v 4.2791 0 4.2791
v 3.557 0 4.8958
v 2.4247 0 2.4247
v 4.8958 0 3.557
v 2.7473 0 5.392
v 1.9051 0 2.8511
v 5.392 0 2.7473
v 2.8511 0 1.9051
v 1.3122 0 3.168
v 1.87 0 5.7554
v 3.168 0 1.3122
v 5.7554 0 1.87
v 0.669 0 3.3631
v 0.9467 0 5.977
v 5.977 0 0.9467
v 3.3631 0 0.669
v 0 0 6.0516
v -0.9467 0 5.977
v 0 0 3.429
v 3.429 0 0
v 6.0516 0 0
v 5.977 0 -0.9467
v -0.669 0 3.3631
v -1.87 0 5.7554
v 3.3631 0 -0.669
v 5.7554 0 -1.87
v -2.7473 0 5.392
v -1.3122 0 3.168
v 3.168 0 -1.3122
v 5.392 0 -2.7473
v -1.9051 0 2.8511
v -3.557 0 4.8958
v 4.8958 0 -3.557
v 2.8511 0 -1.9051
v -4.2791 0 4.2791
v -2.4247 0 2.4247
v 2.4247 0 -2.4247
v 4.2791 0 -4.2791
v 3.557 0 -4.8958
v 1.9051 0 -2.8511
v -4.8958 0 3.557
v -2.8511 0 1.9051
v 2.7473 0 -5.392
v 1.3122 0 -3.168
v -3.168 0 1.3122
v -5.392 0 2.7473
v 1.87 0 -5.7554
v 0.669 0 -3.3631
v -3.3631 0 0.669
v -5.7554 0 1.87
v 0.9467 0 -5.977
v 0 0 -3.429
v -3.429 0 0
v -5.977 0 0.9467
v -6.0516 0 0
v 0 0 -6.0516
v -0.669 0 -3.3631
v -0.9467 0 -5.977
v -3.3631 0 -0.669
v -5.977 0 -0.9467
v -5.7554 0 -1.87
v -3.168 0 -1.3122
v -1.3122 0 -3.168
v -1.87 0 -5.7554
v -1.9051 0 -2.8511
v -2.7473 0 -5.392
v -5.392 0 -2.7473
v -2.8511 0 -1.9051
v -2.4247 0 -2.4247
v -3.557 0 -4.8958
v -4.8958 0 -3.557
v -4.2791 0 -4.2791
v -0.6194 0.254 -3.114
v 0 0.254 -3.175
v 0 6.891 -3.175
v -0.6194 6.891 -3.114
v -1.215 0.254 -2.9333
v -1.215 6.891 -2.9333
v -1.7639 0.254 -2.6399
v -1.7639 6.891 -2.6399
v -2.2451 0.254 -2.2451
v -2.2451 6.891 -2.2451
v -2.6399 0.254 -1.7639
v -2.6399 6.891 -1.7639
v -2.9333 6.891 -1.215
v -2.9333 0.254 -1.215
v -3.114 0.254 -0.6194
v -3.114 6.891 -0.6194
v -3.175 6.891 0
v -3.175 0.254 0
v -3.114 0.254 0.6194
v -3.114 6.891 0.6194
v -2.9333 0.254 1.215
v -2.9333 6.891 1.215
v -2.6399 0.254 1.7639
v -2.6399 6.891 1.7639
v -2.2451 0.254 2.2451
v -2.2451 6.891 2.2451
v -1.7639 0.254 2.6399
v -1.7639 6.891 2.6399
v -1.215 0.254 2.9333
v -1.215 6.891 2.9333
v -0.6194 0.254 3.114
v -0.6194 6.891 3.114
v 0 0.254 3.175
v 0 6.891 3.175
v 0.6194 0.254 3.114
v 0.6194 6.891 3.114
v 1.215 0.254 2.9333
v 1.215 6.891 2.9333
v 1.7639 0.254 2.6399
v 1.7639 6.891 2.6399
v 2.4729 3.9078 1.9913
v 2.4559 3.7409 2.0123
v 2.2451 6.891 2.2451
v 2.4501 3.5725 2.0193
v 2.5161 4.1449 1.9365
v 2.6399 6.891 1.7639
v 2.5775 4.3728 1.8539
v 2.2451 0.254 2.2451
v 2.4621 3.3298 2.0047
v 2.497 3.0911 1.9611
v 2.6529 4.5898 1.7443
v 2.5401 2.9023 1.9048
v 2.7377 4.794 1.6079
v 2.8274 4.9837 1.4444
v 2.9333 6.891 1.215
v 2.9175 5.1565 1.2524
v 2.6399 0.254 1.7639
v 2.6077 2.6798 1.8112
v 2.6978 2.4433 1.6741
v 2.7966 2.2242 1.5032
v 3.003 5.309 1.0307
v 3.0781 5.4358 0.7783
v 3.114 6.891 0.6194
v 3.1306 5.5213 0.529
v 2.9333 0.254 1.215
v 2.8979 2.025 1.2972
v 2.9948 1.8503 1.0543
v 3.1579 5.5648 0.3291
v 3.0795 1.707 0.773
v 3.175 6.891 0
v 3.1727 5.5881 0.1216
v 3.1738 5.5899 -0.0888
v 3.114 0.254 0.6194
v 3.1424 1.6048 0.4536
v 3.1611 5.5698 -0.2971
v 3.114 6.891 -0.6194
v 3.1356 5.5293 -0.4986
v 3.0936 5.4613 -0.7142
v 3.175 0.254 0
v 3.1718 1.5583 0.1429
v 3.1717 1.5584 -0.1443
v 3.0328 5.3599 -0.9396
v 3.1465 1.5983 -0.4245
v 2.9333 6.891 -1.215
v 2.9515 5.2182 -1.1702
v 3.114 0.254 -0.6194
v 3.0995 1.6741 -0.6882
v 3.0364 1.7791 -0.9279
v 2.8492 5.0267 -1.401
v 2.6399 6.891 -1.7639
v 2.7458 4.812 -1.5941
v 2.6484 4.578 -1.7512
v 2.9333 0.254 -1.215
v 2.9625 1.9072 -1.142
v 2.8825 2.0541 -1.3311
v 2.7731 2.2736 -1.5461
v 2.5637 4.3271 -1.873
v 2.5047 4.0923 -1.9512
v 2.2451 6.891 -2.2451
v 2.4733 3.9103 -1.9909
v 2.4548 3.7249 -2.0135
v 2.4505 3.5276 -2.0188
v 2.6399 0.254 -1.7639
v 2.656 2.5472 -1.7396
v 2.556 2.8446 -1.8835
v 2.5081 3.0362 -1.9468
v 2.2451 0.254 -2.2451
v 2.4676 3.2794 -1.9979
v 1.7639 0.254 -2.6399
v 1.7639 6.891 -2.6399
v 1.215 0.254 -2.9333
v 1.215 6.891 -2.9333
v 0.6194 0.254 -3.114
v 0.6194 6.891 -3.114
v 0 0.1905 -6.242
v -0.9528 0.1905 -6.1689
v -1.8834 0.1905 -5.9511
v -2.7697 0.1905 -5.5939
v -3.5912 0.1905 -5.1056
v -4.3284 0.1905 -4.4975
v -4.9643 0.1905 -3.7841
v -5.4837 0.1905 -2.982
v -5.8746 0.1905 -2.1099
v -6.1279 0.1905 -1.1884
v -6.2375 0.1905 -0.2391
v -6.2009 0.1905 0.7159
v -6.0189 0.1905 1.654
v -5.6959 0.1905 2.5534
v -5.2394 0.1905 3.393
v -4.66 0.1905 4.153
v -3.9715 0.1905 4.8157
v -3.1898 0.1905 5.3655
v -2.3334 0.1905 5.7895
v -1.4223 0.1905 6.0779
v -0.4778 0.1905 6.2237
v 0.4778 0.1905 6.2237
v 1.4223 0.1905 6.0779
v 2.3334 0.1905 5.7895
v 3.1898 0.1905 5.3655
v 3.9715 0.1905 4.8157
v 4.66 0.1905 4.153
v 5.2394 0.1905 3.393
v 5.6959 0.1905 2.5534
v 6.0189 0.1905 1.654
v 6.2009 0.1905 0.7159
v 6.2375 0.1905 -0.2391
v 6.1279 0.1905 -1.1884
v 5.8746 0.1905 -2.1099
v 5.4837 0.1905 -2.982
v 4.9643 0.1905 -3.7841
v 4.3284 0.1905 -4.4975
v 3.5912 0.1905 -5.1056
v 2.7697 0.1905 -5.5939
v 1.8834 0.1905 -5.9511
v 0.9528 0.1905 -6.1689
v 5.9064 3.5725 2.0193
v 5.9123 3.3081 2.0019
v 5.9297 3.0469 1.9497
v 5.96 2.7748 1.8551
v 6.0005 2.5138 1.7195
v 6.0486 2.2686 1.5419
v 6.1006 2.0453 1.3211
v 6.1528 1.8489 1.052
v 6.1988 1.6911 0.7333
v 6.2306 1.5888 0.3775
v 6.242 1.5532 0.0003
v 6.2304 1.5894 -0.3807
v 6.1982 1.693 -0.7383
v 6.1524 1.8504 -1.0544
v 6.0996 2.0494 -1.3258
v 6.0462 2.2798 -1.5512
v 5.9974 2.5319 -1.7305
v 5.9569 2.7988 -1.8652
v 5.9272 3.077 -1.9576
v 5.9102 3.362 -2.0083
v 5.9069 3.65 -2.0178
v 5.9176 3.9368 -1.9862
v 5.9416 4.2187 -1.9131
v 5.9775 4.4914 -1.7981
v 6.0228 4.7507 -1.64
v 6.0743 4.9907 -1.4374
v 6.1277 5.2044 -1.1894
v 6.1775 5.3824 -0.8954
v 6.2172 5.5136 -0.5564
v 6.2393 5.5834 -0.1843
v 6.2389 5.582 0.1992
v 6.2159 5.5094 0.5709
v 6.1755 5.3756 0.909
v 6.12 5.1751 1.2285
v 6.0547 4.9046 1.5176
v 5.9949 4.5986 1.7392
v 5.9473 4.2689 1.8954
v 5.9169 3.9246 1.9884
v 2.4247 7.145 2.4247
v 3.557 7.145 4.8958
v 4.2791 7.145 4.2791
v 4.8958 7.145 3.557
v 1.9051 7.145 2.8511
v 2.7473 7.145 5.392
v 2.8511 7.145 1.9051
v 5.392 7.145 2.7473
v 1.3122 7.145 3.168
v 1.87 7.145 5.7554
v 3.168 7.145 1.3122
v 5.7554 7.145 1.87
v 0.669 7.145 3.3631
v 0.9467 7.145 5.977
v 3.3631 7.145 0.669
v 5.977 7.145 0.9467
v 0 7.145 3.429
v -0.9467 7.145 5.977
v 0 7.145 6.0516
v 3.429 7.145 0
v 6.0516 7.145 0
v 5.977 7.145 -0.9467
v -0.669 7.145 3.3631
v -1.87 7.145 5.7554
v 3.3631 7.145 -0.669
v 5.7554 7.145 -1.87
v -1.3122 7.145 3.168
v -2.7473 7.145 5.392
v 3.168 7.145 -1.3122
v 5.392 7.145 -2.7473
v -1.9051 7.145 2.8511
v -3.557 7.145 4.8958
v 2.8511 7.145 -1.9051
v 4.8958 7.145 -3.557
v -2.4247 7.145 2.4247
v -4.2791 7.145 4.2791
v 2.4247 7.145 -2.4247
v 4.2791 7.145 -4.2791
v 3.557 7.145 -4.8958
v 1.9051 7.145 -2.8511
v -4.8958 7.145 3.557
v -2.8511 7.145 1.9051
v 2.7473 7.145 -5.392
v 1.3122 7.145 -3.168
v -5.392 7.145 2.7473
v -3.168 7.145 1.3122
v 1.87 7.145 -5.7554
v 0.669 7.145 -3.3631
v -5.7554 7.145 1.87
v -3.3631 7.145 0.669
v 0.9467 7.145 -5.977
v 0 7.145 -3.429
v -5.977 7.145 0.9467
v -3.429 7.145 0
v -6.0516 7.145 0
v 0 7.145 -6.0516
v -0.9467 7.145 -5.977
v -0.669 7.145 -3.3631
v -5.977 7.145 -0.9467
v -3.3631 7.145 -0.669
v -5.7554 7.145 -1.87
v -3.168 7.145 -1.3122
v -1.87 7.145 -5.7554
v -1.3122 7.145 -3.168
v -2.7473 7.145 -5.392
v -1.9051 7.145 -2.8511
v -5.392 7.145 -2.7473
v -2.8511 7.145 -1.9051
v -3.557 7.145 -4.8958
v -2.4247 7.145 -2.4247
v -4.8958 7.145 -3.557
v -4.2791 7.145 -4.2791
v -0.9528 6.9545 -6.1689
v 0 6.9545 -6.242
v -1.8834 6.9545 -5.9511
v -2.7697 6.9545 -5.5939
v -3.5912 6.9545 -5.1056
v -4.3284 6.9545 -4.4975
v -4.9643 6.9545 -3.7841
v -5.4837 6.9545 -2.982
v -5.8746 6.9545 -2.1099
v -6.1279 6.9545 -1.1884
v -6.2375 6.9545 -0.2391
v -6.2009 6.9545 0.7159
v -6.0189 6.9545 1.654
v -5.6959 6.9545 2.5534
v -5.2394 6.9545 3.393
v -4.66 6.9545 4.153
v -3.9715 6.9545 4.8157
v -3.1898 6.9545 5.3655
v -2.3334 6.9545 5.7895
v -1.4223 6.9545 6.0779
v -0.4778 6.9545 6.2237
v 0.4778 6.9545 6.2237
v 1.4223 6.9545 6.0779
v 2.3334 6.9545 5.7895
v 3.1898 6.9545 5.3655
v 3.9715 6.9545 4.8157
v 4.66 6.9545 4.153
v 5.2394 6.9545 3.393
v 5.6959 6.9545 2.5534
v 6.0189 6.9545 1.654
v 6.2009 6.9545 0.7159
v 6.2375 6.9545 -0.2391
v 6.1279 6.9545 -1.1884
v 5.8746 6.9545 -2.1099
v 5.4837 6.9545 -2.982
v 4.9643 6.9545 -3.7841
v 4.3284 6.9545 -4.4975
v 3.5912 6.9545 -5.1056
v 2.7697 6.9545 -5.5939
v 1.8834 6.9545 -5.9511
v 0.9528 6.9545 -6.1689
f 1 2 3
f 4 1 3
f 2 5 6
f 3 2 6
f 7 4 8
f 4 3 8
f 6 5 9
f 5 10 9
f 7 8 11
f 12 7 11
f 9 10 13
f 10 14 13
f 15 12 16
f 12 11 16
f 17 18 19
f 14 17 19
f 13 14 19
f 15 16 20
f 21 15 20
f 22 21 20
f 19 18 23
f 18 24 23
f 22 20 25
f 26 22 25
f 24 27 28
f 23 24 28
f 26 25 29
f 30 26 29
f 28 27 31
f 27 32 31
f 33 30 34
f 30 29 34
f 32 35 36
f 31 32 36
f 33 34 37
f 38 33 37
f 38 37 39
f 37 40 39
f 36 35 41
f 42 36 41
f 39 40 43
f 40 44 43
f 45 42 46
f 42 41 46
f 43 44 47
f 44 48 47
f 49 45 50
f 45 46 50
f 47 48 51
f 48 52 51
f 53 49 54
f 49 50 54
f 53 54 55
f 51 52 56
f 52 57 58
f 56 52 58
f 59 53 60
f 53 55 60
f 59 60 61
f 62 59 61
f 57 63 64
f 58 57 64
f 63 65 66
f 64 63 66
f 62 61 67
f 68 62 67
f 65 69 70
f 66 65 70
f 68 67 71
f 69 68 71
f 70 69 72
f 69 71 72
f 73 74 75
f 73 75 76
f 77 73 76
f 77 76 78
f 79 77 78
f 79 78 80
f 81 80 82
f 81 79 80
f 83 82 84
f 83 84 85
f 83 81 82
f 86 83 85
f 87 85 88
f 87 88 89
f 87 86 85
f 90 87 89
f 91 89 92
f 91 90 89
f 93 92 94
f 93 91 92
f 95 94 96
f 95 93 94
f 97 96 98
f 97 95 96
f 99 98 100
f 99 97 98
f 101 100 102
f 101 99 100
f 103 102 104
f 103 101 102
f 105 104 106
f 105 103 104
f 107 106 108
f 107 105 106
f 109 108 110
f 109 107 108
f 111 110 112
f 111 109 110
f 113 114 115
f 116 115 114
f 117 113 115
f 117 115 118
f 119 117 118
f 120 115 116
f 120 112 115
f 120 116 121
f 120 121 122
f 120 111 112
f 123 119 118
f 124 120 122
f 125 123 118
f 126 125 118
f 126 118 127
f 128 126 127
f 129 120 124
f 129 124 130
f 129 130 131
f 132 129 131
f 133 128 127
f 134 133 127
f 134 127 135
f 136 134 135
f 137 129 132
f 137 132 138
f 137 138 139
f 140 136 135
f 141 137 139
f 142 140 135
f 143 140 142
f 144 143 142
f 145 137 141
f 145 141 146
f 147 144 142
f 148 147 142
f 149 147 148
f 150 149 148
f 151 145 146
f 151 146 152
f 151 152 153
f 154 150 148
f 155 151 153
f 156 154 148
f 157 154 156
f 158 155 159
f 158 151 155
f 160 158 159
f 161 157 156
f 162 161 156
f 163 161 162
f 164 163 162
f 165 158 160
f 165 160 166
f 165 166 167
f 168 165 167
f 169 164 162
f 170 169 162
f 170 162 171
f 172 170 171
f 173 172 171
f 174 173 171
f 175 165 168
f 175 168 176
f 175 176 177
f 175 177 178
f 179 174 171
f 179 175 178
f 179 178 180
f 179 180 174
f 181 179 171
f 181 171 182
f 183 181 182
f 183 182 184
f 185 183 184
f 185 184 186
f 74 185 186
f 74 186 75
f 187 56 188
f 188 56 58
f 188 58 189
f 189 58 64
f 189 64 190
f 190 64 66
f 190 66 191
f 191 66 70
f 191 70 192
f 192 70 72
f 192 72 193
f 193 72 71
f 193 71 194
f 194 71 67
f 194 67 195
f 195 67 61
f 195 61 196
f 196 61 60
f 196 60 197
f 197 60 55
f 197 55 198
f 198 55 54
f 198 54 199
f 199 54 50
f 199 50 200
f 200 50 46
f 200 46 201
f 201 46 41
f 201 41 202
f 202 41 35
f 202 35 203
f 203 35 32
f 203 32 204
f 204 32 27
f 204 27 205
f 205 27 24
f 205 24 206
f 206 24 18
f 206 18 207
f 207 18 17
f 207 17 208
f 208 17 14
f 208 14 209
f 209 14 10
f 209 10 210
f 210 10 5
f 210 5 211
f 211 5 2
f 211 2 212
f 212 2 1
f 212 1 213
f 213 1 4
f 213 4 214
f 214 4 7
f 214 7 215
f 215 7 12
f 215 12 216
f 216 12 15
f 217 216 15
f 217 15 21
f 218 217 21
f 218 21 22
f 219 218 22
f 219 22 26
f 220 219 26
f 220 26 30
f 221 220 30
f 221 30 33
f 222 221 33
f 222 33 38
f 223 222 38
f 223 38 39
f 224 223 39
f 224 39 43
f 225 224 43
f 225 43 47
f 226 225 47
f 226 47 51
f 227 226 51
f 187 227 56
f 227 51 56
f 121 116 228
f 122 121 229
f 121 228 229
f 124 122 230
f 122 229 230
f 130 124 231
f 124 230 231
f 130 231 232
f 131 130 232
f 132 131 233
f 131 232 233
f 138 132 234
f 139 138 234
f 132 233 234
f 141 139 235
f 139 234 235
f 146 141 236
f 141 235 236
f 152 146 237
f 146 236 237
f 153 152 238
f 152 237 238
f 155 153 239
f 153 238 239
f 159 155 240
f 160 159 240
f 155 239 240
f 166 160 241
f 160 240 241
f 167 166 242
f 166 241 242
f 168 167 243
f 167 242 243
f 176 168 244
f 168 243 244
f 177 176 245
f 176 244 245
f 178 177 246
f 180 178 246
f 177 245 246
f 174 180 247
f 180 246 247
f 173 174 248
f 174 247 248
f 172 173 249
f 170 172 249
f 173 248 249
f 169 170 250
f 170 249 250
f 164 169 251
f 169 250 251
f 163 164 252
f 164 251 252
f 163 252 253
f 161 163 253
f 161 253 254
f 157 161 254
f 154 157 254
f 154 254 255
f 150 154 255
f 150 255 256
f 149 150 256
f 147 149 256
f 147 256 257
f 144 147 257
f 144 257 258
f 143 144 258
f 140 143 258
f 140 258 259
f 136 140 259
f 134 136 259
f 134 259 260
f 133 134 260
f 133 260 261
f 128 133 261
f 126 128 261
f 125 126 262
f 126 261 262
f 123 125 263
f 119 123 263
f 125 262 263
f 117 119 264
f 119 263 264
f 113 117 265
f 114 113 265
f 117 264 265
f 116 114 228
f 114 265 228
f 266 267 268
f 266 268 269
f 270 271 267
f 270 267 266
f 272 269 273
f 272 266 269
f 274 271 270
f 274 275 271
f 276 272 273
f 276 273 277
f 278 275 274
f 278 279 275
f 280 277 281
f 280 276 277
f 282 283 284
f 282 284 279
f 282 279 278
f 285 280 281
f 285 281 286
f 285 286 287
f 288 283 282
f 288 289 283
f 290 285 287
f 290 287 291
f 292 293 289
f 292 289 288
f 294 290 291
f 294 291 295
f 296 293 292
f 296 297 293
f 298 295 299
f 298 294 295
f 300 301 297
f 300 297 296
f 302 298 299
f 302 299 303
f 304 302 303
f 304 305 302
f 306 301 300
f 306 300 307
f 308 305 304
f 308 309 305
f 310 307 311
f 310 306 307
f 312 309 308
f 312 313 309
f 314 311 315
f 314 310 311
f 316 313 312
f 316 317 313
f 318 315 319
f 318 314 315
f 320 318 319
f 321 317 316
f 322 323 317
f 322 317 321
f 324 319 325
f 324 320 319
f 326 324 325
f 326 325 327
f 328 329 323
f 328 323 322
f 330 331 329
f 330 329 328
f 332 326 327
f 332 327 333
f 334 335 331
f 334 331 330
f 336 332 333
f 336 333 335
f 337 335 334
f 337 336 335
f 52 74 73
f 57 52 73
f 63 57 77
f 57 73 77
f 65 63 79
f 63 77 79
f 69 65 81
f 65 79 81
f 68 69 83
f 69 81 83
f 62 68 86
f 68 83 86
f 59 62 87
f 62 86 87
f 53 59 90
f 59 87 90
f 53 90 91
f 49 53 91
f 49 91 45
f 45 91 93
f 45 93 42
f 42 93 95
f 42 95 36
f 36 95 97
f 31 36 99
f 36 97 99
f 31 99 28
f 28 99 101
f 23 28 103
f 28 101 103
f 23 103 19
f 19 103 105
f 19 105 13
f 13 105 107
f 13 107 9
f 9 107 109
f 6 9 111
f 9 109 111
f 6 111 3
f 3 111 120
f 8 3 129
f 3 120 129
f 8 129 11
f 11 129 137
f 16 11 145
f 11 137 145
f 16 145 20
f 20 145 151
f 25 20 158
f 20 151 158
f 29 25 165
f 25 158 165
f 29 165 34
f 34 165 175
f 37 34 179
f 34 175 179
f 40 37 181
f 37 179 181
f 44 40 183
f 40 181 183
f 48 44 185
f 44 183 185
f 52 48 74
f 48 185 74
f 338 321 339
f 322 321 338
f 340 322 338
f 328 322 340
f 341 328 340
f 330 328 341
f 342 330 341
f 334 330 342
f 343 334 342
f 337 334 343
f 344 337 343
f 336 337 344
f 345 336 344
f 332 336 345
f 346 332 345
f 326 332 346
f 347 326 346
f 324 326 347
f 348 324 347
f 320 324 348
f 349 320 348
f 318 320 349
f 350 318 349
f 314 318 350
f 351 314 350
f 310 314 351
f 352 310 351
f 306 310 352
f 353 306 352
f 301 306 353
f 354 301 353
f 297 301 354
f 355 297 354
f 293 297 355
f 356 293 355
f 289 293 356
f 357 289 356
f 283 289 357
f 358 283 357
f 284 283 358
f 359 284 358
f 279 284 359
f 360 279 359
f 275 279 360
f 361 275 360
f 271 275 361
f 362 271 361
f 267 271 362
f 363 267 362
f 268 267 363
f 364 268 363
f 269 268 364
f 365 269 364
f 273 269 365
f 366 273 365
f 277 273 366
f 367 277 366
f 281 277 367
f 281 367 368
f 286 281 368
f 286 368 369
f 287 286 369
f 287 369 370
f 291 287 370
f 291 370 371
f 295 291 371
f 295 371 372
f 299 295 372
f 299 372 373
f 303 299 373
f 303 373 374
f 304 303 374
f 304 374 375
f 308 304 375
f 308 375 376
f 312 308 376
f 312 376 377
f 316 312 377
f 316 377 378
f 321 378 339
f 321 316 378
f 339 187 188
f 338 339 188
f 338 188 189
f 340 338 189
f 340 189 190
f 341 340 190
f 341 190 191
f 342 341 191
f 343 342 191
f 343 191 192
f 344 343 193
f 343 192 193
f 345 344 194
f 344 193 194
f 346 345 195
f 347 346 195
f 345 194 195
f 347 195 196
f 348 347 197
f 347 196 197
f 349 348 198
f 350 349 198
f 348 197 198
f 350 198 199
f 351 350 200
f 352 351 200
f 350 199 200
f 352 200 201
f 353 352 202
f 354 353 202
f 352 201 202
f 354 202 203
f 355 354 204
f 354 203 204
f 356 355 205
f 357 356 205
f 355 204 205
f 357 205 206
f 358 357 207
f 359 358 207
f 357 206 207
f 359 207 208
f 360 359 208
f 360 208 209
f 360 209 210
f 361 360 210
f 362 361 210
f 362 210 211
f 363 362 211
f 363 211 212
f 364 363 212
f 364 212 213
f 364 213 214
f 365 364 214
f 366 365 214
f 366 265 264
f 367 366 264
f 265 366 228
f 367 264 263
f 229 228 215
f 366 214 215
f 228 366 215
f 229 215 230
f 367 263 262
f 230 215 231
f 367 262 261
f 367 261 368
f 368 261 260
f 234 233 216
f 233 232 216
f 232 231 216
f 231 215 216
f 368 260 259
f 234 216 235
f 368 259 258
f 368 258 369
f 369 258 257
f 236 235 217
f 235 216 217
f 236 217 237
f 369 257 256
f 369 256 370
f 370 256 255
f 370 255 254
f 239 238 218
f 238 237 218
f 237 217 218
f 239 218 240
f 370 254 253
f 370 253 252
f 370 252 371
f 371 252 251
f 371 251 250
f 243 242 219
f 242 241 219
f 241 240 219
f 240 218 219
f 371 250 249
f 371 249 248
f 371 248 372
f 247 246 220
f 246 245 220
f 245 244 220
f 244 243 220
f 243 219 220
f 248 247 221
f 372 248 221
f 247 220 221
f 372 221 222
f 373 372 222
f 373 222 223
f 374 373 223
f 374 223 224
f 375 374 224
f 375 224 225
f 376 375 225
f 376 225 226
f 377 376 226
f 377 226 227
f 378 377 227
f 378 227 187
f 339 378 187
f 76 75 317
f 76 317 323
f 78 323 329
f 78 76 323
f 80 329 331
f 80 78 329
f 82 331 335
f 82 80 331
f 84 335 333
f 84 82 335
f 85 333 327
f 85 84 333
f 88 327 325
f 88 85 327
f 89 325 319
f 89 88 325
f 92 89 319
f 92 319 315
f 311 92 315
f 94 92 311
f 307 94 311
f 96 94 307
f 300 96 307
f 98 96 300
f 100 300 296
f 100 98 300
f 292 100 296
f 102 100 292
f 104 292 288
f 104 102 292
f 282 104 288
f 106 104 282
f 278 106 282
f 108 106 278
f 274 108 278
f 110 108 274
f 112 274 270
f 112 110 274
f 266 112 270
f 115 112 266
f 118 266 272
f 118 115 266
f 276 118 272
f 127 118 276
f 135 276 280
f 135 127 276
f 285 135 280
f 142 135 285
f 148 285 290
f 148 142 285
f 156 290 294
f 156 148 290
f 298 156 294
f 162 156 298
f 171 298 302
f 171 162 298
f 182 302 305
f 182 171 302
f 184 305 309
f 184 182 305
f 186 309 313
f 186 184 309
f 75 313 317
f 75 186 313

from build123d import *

# Parameters (mm, degrees)
SKETCH1_R           = 6.24205
SKETCH1_R_2         = 3.175
BOSS_EXTRUDE1_DEPTH = 7.14502
CHAMFER1_SIZE       = 0.1905
CHAMFER2_SIZE       = 0.254
SKETCH3_W           = 2.0193
SKETCH3_H           = 6.24205


with BuildPart() as part:
    # Sketch1 → Boss-Extrude1 (new body)
    with BuildSketch(Plane(origin=(0, 0, 0), x_dir=(1, 0, 0), z_dir=(0, 1, 0))):
        with Locations(Location((0, 0, 0), (0, 0, 90))):
            Circle(SKETCH1_R)
        with Locations(Location((0, 0, 0), (0, 0, 90))):
            Circle(SKETCH1_R_2, mode=Mode.SUBTRACT)
    extrude(amount=BOSS_EXTRUDE1_DEPTH)

    # Chamfer1
    chamfer1_edges = [part.edges().sort_by_distance(p)[0] for p in [
        (0, 0, 6.24205),
        (0, 7.14502, 6.24205),
    ]]
    chamfer(chamfer1_edges, length=CHAMFER1_SIZE)

    # Chamfer2
    chamfer2_edges = [part.edges().sort_by_distance(p)[0] for p in [
        (0, 0, 3.175),
        (0, 7.14502, 3.175),
    ]]
    chamfer(chamfer2_edges, length=CHAMFER2_SIZE)

    # Sketch3 → #10-32 Tapped Hole1 (revolve, cut)
    with BuildSketch(Plane.ZX.offset(3.57251)):
        with Locations((1.00965, 3.121025)):
            Rectangle(SKETCH3_W, SKETCH3_H)
    revolve(axis=Axis((-6.35, 3.57251, 0), (1, 0, 0)), mode=Mode.SUBTRACT)


solid = part.part
